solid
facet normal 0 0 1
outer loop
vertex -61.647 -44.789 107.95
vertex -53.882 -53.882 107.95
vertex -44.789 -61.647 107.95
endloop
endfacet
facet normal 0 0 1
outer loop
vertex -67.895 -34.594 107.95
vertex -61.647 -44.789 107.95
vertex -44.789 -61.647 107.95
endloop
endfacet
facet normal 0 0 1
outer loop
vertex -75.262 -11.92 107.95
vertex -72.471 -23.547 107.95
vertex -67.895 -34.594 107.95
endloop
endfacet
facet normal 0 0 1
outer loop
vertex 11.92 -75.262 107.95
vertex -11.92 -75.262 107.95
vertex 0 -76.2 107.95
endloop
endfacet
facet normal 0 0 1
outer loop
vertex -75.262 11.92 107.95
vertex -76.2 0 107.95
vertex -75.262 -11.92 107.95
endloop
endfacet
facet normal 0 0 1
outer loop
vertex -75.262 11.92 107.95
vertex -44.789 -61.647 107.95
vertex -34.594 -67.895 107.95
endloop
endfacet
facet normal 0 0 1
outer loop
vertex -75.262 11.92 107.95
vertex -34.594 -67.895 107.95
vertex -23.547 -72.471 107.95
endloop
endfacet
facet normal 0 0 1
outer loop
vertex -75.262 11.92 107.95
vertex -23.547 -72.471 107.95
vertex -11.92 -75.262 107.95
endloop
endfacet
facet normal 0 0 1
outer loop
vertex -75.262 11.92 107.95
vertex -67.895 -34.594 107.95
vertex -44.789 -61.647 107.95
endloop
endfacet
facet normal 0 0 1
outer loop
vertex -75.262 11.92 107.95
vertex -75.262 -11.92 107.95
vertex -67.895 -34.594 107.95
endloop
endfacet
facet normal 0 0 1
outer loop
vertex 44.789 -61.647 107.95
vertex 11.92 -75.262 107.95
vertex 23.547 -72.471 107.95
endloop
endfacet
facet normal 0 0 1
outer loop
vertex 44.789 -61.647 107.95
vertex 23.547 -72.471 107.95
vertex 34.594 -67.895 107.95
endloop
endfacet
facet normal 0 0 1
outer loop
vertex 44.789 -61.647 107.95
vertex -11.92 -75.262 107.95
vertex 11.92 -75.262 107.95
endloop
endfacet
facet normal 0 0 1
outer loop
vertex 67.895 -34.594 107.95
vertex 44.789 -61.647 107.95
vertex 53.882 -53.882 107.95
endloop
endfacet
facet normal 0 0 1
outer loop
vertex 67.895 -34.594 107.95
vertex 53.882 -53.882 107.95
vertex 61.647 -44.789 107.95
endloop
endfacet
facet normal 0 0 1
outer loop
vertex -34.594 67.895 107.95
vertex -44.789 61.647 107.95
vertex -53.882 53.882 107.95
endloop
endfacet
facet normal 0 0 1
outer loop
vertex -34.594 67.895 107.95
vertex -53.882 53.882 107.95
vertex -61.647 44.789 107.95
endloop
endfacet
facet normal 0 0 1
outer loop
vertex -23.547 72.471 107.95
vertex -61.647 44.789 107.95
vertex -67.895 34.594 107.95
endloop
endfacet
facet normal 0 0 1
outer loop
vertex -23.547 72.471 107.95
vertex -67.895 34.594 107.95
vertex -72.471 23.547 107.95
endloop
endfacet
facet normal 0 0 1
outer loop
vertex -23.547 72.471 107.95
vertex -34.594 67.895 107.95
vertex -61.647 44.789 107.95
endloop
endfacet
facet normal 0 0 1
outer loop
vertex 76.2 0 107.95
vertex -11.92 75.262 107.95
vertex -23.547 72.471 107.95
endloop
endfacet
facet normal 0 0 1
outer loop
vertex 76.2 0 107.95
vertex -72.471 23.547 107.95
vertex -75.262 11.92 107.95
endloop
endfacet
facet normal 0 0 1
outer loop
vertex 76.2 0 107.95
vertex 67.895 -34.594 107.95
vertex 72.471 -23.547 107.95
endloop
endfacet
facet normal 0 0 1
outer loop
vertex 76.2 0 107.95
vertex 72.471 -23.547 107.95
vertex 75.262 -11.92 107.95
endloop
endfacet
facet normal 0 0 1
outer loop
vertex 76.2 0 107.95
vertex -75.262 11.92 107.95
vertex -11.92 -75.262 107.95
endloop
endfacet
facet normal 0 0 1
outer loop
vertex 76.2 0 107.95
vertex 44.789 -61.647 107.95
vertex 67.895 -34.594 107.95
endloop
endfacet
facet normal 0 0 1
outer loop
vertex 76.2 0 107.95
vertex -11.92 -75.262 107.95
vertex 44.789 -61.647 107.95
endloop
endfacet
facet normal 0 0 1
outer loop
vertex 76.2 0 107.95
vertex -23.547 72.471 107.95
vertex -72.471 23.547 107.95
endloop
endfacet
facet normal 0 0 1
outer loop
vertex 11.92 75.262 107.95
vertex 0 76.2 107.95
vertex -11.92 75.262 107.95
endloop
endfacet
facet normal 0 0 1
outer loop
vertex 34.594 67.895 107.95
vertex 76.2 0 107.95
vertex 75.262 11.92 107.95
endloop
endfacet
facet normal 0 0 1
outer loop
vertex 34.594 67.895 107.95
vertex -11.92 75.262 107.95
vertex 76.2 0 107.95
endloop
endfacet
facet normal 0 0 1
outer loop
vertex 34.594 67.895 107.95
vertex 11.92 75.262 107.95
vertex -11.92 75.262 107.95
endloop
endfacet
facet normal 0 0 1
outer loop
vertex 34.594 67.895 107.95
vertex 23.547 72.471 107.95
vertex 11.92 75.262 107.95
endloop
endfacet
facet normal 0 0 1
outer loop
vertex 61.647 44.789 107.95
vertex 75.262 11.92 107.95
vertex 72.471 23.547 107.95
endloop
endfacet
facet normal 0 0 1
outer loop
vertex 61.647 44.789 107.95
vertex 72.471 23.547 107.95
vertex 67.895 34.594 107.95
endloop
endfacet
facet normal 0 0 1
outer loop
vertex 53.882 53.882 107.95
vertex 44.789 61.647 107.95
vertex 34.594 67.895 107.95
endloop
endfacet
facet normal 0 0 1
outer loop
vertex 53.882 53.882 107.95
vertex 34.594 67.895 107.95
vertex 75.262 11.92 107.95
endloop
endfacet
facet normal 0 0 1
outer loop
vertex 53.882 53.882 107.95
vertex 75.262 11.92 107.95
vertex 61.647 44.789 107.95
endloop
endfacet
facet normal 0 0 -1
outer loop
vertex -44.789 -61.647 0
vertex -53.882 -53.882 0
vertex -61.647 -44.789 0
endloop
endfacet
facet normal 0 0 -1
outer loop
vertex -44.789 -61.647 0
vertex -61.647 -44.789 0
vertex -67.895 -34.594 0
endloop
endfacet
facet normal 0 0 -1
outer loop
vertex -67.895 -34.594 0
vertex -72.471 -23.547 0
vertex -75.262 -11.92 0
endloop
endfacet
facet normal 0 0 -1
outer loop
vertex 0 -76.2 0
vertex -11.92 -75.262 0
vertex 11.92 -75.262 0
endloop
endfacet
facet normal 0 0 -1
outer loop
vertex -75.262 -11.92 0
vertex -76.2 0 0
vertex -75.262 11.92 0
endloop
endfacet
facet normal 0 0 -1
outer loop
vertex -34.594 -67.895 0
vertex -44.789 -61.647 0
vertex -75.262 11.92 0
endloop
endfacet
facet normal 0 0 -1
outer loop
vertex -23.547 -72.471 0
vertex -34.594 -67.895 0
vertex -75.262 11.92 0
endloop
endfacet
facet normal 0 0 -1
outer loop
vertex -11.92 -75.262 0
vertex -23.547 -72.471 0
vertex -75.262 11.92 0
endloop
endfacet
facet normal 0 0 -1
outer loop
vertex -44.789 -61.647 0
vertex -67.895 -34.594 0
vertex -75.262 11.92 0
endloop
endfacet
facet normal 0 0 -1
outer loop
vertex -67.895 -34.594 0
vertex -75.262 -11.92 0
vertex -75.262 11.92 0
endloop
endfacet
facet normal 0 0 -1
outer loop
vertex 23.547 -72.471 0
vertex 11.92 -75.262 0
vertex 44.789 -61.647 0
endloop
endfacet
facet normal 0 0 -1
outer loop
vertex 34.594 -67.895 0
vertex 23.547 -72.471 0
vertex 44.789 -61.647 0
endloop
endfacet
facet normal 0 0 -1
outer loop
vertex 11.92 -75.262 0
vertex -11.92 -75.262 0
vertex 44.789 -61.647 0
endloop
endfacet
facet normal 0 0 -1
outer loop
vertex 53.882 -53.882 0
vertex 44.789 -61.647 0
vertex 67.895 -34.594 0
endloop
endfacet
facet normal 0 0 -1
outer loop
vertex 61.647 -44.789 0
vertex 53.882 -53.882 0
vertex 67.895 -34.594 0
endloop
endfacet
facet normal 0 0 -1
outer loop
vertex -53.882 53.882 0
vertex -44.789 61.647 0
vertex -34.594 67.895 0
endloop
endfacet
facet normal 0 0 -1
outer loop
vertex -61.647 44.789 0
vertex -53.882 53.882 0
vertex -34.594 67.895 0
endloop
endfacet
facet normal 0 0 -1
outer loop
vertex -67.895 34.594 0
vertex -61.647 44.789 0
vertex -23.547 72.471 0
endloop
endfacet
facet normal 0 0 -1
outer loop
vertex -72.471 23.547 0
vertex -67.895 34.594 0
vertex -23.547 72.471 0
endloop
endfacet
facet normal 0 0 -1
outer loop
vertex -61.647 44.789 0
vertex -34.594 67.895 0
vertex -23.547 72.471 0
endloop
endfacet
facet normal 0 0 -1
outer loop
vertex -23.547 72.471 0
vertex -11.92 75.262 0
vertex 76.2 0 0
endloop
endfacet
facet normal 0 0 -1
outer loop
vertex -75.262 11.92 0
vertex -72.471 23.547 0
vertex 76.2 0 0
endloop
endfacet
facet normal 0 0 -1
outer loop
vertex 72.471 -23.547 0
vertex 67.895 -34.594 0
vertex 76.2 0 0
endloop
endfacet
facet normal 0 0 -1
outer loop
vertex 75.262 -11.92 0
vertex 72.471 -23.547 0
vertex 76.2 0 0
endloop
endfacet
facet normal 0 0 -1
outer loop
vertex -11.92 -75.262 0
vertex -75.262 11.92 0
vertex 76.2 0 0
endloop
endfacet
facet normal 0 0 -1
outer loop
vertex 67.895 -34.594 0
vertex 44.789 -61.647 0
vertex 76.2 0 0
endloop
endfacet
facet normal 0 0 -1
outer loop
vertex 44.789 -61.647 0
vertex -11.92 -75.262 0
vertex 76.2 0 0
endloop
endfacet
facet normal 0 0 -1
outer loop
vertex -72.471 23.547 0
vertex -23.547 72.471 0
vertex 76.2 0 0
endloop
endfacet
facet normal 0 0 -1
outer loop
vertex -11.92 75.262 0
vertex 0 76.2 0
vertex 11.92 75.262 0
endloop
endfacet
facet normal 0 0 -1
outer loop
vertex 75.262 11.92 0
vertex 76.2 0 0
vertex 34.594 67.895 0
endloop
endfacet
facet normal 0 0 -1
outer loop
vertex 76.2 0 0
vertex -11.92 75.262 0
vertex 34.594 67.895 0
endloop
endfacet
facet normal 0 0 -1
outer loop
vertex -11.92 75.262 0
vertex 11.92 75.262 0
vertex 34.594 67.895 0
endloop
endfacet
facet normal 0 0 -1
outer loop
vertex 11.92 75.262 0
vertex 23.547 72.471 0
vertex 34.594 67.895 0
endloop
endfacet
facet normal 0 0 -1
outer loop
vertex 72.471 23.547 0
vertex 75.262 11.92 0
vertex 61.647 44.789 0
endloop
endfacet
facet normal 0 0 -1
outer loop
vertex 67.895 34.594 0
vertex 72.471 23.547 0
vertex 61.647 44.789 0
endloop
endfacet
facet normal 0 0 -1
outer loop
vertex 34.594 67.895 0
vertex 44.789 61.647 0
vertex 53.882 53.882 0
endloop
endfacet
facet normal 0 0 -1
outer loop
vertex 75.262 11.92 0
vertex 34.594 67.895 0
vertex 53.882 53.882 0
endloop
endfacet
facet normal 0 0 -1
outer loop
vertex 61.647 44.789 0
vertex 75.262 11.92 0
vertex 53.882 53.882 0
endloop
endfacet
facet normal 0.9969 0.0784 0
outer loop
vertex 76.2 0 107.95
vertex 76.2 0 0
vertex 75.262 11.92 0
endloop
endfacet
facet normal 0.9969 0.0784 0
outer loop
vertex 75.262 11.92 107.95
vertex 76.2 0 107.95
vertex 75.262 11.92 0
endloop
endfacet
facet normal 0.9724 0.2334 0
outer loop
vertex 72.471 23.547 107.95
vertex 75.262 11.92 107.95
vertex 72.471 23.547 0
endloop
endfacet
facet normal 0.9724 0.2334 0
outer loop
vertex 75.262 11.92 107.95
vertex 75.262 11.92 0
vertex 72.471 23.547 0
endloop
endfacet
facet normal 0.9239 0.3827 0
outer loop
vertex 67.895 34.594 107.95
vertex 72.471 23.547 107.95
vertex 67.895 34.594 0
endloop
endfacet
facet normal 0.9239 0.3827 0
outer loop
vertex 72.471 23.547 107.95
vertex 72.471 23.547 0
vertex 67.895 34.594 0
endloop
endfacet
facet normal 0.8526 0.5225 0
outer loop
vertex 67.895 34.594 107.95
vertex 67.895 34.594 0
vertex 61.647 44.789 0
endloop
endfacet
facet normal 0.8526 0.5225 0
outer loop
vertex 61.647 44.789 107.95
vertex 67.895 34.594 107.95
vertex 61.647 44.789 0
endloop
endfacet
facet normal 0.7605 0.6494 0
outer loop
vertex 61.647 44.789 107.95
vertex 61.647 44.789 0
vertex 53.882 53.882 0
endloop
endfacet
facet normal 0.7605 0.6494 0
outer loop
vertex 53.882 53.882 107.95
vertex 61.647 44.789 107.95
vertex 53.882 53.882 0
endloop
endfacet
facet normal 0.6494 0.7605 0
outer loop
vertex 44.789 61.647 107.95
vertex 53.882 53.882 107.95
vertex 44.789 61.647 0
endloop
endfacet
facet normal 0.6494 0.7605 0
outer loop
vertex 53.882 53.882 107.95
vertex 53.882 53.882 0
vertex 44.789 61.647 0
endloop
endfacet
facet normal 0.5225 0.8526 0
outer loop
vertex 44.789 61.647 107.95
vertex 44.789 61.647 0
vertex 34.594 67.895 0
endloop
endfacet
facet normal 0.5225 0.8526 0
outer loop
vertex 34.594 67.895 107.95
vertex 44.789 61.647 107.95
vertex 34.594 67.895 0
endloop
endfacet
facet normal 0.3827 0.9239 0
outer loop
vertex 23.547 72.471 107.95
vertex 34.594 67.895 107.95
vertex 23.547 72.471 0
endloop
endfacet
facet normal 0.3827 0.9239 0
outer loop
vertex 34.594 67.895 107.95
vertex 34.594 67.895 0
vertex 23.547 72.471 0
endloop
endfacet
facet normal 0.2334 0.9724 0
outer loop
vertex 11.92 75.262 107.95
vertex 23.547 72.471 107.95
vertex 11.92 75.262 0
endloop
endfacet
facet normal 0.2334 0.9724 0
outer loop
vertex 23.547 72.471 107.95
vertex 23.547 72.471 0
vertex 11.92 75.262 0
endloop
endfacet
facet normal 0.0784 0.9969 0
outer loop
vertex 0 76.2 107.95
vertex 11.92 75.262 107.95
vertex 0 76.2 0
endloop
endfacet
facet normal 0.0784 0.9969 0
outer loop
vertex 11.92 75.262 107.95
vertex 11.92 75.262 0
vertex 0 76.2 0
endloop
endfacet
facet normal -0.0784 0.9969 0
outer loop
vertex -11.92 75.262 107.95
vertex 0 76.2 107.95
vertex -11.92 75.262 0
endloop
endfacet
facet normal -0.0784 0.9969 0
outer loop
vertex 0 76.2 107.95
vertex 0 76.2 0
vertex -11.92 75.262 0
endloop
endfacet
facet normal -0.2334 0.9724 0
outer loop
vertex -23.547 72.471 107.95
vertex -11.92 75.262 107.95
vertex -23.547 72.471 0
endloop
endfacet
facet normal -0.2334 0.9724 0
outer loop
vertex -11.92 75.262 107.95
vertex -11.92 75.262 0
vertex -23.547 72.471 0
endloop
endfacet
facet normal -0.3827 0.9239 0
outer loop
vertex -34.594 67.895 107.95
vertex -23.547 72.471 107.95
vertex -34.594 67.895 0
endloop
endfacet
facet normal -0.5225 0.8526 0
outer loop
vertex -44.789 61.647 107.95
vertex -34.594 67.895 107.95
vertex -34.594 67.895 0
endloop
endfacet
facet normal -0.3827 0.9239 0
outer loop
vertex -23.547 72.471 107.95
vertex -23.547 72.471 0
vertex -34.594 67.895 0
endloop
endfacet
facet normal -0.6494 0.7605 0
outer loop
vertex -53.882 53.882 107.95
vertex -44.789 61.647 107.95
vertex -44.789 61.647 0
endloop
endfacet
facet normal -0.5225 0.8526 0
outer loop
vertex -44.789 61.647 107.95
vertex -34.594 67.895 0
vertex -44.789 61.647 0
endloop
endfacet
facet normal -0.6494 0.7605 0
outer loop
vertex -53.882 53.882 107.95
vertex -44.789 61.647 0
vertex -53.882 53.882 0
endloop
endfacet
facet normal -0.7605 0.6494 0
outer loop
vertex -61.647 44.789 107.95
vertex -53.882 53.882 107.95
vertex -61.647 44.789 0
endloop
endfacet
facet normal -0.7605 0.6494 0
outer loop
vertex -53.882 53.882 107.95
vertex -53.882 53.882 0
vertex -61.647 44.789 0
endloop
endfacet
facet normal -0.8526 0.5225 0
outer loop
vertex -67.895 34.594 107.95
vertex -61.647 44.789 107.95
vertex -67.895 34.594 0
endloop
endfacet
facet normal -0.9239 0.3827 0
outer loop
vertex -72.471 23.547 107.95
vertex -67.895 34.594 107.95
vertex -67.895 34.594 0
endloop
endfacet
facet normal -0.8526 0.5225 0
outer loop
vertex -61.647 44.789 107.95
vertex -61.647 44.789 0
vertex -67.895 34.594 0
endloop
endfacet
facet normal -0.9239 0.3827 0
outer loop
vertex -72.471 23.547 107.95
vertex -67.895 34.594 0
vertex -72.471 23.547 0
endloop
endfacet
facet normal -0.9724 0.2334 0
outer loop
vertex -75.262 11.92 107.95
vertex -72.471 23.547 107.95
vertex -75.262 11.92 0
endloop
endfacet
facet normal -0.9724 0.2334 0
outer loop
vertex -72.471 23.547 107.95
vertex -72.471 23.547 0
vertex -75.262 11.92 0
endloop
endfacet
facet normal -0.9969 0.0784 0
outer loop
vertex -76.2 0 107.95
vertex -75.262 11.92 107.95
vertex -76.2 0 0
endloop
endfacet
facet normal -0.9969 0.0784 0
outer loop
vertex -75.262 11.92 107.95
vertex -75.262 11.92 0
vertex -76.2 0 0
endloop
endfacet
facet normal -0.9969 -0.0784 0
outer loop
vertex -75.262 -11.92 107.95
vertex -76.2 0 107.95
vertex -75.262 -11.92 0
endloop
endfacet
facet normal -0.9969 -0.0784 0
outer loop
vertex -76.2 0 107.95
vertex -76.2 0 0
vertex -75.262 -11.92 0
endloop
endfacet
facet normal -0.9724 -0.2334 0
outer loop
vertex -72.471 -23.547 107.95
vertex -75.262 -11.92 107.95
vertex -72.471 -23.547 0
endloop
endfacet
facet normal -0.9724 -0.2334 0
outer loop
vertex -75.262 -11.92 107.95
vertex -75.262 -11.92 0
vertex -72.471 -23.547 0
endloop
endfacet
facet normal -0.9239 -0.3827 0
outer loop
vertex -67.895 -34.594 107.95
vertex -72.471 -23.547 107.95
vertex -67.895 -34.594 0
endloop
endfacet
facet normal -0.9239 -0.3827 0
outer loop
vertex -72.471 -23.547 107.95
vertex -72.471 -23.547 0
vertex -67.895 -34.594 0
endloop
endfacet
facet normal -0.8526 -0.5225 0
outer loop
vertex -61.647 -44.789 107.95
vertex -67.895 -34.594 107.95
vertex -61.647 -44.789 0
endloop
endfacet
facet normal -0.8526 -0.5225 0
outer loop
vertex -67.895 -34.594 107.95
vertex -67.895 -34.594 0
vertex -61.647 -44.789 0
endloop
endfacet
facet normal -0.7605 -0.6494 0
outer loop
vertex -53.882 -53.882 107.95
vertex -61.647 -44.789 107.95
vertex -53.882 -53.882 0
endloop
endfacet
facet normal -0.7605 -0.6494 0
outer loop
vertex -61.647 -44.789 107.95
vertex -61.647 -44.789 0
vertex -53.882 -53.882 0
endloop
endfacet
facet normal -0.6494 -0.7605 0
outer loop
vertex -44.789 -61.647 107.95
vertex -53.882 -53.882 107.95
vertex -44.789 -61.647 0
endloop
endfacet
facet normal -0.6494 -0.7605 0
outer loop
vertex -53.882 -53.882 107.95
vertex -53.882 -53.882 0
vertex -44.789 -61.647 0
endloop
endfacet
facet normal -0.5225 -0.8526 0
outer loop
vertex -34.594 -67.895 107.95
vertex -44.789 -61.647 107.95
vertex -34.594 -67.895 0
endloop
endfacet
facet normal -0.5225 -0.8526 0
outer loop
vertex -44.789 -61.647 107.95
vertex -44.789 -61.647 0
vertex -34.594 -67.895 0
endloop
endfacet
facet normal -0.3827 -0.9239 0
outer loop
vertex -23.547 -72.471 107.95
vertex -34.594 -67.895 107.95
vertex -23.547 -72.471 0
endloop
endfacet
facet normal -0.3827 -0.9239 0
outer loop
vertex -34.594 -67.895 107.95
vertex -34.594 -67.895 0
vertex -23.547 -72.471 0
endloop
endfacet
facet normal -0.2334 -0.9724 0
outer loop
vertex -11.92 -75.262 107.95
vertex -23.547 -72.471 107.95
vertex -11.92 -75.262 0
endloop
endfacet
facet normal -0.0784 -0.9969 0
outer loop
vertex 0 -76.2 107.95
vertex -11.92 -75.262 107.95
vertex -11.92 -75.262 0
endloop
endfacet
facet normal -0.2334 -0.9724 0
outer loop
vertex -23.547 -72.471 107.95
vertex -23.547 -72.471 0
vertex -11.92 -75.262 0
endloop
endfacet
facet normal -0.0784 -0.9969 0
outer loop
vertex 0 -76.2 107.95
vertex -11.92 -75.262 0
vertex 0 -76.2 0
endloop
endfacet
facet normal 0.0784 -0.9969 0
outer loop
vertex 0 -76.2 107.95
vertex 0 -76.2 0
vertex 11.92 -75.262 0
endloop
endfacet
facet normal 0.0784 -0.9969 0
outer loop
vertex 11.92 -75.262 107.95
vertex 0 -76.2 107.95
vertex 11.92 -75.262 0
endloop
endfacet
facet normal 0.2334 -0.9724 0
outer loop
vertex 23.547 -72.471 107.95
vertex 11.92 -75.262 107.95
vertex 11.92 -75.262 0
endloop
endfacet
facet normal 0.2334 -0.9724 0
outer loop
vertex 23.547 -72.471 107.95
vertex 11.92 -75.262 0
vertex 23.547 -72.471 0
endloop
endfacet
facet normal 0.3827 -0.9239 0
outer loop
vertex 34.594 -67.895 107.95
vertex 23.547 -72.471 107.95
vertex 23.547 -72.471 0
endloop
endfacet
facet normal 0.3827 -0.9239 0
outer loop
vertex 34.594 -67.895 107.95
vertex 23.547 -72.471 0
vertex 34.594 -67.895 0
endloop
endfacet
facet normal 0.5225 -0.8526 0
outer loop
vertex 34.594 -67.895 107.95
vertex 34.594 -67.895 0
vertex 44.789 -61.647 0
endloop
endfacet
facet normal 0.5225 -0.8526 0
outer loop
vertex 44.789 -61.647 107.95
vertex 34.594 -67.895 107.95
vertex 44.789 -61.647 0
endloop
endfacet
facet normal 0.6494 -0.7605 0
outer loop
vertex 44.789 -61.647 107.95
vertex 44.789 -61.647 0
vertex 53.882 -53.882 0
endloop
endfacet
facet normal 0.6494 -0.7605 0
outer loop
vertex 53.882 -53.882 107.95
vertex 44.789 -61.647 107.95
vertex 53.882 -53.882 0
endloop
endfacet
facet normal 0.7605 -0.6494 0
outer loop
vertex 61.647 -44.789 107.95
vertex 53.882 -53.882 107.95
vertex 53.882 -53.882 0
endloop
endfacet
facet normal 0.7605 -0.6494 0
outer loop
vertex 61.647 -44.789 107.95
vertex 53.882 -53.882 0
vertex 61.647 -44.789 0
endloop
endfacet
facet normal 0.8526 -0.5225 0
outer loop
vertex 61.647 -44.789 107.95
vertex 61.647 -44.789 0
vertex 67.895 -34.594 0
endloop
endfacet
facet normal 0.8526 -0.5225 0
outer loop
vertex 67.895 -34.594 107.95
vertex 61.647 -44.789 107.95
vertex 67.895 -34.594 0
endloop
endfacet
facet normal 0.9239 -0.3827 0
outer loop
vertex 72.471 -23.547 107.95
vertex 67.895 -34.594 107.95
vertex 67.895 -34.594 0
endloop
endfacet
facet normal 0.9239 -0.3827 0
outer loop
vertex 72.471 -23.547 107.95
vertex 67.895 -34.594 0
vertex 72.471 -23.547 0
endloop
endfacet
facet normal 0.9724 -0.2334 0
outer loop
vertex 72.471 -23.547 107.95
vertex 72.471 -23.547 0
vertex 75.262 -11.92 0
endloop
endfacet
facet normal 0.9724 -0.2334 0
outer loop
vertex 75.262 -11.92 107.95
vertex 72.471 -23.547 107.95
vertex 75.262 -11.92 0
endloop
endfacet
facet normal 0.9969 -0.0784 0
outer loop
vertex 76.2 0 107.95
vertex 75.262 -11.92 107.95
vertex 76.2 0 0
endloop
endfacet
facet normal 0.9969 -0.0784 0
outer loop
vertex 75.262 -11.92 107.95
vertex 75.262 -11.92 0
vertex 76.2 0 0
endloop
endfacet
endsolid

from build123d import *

# Parameters (mm, degrees)
F0_R     = 76.2
F1_DEPTH = 107.95
F2_R     = 15.820563
F3_DEPTH = 235.204
F4_R     = 29.432713
F5_DEPTH = 293.116


with BuildPart() as f1:
    # F0 (on Top) → F1 (new body)
    with BuildSketch(Plane.XY):
        Circle(F0_R)
    extrude(amount=F1_DEPTH)

    # F2 (on Top) → F3 (cut)
    with BuildSketch(Plane.XY):
        with Locations((-136.144727, 109.994054)):
            Circle(F2_R)
    extrude(amount=-F3_DEPTH, mode=Mode.SUBTRACT)

    # F4 (on Top) → F5 (cut)
    with BuildSketch(Plane.XY):
        Circle(F4_R)
    extrude(amount=-F5_DEPTH, mode=Mode.SUBTRACT)


solid = f1.part
